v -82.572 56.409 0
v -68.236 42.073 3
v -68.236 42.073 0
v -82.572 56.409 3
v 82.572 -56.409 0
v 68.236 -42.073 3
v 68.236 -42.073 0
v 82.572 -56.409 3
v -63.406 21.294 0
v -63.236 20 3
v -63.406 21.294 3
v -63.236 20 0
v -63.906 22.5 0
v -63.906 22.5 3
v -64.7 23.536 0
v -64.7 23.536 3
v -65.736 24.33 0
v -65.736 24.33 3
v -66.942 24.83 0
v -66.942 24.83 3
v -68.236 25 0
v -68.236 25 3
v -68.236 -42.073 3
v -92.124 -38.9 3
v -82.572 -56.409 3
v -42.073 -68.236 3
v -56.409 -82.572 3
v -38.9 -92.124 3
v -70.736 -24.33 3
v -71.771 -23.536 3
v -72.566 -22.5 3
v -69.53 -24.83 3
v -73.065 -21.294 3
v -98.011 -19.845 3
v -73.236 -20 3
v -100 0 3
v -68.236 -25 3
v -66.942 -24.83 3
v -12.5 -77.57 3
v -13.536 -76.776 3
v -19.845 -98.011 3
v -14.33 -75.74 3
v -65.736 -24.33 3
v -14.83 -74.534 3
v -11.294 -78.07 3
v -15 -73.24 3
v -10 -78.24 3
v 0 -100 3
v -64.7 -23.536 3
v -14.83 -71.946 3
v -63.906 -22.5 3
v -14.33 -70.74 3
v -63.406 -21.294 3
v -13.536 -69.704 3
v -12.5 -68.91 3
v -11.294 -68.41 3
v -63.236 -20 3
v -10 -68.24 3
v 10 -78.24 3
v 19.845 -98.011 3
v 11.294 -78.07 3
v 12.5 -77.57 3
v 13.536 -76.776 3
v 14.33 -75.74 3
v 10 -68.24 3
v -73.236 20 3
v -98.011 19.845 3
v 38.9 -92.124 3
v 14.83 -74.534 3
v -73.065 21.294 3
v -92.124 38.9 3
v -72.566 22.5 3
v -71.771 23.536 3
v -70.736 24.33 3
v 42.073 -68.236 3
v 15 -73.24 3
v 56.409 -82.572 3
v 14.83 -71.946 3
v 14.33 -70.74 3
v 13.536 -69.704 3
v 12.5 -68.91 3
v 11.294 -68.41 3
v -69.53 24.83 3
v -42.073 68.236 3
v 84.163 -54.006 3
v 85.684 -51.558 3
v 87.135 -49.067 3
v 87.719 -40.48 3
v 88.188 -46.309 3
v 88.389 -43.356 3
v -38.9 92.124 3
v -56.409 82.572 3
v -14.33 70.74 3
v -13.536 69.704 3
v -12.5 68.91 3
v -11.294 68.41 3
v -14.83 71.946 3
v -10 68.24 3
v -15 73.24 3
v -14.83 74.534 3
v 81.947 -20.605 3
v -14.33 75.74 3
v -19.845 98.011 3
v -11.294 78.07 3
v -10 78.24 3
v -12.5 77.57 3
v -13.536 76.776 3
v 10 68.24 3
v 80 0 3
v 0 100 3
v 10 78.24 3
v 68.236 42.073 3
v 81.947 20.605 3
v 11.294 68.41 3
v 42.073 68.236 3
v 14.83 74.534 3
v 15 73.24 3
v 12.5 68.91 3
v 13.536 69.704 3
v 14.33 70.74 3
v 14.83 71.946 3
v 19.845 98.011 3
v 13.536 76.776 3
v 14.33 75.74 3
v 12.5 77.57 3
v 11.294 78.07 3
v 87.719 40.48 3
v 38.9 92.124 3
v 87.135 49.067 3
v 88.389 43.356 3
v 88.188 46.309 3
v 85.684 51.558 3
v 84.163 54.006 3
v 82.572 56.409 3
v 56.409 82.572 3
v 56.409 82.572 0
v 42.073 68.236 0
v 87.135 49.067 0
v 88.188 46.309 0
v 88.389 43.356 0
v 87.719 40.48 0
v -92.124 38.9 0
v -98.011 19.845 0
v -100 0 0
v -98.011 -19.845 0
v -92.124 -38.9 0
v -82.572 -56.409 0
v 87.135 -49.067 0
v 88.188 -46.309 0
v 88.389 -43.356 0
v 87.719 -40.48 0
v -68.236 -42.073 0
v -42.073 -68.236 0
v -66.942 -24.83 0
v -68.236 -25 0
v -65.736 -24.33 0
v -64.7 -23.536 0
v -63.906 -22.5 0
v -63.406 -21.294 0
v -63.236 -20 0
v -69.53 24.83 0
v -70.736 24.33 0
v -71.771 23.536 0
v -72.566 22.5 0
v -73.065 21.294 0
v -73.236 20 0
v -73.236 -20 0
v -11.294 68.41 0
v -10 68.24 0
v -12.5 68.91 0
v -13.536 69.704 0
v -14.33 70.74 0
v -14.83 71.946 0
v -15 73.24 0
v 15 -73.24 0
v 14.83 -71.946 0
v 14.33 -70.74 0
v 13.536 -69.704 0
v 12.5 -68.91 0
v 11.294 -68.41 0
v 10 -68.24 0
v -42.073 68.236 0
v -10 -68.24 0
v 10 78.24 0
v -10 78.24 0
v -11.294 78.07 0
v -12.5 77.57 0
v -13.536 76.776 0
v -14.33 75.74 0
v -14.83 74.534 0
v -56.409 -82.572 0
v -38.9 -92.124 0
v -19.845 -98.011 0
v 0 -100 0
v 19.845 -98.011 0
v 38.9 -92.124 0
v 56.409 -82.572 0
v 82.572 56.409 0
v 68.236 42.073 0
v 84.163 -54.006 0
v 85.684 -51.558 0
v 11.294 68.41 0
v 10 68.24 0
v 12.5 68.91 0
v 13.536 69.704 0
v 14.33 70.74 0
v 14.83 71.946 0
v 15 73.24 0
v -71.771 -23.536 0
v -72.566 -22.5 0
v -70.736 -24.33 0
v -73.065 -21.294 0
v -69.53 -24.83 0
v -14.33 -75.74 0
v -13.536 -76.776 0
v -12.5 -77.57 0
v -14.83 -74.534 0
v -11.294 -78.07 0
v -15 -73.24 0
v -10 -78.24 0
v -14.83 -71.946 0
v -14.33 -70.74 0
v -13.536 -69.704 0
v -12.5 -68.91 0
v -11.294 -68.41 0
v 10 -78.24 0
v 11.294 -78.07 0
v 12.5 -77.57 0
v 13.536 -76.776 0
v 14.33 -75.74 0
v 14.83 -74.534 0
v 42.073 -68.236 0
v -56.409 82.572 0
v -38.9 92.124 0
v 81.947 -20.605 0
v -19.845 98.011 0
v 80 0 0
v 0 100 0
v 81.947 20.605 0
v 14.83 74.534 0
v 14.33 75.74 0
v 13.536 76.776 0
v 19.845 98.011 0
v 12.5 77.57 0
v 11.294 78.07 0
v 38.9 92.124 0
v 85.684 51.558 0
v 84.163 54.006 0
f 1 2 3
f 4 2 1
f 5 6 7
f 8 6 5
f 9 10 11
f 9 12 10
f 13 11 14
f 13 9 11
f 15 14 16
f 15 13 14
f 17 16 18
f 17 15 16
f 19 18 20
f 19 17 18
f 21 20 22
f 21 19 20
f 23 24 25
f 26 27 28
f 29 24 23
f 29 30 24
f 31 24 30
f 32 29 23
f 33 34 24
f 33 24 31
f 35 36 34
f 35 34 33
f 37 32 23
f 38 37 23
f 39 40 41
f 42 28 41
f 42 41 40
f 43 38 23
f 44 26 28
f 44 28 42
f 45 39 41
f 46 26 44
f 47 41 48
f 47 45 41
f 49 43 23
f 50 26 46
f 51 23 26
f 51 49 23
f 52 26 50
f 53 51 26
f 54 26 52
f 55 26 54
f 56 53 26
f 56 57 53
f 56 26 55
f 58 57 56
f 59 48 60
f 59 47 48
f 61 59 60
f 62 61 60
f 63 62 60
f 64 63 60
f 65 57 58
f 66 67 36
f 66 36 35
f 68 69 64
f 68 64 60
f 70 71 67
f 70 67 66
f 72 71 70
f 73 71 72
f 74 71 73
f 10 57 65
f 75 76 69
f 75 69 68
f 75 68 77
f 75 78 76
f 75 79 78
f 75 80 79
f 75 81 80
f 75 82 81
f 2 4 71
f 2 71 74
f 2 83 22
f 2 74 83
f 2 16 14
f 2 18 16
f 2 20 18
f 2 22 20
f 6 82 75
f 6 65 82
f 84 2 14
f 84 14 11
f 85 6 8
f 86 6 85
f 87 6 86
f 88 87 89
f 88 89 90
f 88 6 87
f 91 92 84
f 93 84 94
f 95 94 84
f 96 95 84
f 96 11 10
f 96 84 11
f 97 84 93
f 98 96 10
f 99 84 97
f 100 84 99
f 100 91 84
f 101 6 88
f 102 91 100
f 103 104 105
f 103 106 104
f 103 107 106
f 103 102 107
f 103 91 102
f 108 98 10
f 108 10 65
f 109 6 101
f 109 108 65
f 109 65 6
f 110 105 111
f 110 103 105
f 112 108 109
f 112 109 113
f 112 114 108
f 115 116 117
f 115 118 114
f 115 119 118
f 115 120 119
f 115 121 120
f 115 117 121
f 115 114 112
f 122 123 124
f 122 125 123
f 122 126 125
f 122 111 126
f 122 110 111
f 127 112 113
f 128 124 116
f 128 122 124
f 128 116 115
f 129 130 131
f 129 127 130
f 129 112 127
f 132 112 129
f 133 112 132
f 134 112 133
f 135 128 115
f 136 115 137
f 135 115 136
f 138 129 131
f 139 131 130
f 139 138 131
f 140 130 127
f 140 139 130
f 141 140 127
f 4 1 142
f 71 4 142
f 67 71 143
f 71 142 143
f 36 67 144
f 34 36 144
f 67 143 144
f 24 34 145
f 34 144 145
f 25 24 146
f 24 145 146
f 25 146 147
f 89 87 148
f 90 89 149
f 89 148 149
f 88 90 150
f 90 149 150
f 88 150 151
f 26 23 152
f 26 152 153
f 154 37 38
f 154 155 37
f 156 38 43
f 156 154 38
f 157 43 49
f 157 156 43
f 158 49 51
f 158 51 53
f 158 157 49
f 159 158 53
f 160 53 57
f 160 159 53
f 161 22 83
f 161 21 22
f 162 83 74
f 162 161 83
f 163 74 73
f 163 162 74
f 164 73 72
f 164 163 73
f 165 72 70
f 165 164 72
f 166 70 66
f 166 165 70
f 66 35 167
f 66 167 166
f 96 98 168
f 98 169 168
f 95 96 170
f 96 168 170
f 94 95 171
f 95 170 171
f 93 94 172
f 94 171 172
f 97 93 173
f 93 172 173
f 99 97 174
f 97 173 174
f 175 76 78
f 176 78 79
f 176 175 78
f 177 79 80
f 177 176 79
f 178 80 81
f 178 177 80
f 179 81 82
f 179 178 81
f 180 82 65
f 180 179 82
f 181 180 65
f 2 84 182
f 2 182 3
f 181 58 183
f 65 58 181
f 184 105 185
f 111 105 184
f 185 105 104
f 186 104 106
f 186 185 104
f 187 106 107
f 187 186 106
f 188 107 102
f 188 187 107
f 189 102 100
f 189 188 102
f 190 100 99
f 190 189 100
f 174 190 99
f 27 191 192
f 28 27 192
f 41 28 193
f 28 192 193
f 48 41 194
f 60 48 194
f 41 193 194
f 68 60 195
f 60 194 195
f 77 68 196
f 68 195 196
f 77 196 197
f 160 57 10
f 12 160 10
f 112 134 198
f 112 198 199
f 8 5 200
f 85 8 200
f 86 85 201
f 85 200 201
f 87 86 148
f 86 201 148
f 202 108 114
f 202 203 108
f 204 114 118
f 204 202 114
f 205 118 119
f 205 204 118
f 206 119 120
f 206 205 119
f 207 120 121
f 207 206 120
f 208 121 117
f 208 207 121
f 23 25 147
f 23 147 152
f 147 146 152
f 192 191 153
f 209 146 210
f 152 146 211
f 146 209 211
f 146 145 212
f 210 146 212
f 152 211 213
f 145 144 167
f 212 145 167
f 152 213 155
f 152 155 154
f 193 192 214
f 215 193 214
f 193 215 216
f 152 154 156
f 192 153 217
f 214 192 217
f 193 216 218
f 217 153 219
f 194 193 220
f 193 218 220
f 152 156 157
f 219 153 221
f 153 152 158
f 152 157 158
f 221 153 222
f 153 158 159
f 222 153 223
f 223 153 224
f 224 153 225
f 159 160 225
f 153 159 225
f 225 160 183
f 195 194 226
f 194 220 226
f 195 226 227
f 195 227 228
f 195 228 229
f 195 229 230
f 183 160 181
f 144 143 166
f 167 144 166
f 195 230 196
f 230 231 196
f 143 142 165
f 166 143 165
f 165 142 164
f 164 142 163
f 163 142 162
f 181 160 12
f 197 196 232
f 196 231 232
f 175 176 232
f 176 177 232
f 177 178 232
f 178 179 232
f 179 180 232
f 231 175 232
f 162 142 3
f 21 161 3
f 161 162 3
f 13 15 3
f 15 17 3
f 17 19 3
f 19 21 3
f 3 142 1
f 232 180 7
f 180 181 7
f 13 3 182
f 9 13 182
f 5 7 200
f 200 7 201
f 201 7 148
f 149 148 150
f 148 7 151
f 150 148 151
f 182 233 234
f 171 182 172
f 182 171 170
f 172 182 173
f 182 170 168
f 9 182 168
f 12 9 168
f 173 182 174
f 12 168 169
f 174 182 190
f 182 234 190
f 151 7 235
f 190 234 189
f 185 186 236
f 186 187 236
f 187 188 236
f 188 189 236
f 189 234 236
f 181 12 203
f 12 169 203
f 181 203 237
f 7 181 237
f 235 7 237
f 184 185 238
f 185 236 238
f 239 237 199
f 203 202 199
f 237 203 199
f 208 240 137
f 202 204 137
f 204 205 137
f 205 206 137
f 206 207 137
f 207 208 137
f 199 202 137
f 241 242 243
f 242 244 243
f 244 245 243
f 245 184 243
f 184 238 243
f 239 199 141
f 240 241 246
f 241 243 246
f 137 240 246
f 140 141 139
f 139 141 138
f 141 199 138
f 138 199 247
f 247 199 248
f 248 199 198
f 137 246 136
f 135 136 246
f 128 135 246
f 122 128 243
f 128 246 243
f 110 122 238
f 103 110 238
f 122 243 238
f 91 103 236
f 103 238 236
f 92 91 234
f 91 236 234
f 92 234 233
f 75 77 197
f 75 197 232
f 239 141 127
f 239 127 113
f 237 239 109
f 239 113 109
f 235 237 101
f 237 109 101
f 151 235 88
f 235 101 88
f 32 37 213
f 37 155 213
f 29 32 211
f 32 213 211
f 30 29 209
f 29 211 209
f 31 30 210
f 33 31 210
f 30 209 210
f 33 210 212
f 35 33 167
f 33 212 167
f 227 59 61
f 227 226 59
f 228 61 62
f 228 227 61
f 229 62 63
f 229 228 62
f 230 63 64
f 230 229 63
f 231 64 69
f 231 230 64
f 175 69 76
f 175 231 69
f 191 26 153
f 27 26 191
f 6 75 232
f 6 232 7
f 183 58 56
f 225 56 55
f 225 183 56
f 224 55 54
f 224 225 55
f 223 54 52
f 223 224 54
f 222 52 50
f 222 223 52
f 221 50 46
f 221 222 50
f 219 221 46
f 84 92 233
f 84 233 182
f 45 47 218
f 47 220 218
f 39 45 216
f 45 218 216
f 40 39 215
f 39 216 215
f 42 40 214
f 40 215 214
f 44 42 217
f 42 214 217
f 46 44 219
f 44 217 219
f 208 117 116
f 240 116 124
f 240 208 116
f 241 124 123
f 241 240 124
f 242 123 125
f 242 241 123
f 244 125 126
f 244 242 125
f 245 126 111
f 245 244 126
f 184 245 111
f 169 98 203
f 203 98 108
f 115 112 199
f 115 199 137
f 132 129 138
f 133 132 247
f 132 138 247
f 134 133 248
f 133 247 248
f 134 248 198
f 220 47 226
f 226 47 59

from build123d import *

# Parameters (mm, degrees)
CROQUIS1_R              = 100
SALIENTE_EXTRUIR1_DEPTH = 3
CROQUIS3_R              = 110
CORTAR_EXTRUIR1_DEPTH   = 3
REDONDEO1_R             = 10
CORTAR_EXTRUIR2_DEPTH   = 142.453172607
CROQUIS6_W              = 10
CROQUIS6_H              = 50
CROQUIS6_W_2            = 30
CROQUIS6_H_2            = 10
CORTAR_EXTRUIR4_DEPTH   = 10
REDONDEO3_R             = 5


with BuildPart() as part:
    # Croquis1 → Saliente-Extruir1 (new body)
    with BuildSketch(Plane.XY):
        Circle(CROQUIS1_R)
    extrude(amount=SALIENTE_EXTRUIR1_DEPTH)

    # Croquis3 → Cortar-Extruir1 (cut)
    with BuildSketch(Plane.XY.offset(3)):
        with Locations((190, 0)):
            Circle(CROQUIS3_R)
    extrude(amount=-CORTAR_EXTRUIR1_DEPTH, mode=Mode.SUBTRACT)

    # Redondeo1
    redondeo1_edges = [part.edges().sort_by_distance(p)[0] for p in [
        (89.473684211, -44.659375654, 1.5),
        (89.473684211, 44.659375654, 1.5),
    ]]
    fillet(redondeo1_edges, radius=REDONDEO1_R)

    # Croquis4 → Cortar-Extruir2 (cut, through all)
    with BuildSketch(Plane.XY.offset(3)):
        Polygon((-57.629202667, -83.792153571), (-83.792153571, -57.629202667), (-68.235804385, -42.072853481), (-42.072853481, -68.235804385), align=None)
        Polygon((-57.629202667, 83.792153571), (-42.072853481, 68.235804385), (-68.235804385, 42.072853481), (-83.792153571, 57.629202667), align=None)
        Polygon((83.792153571, 57.629202667), (68.235804385, 42.072853481), (42.072853481, 68.235804385), (57.629202667, 83.792153571), align=None)
        Polygon((57.629202667, -83.792153571), (42.072853481, -68.235804385), (68.235804385, -42.072853481), (83.792153571, -57.629202667), align=None)
    extrude(amount=-CORTAR_EXTRUIR2_DEPTH, mode=Mode.SUBTRACT)

    # Croquis6 → Cortar-Extruir4 (cut)
    with BuildSketch(Plane.XY.offset(3)):
        with Locations((-68.235804385, 0)):
            Rectangle(CROQUIS6_W, CROQUIS6_H)
        with Locations((0, 73.24)):
            Rectangle(CROQUIS6_W_2, CROQUIS6_H_2)
        with Locations((0, -73.24)):
            Rectangle(CROQUIS6_W_2, CROQUIS6_H_2)
    extrude(amount=-CORTAR_EXTRUIR4_DEPTH, mode=Mode.SUBTRACT)

    # Redondeo3
    redondeo3_edges = [part.edges().sort_by_distance(p)[0] for p in [
        (15, -78.24, 1.5),
        (-15, -78.24, 1.5),
        (15, -68.24, 1.5),
        (-15, -68.24, 1.5),
        (-73.235804385, -25, 1.5),
        (-63.235804385, -25, 1.5),
        (-73.235804385, 25, 1.5),
        (-63.235804385, 25, 1.5),
        (-15, 68.24, 1.5),
        (15, 68.24, 1.5),
        (-15, 78.24, 1.5),
        (15, 78.24, 1.5),
    ]]
    fillet(redondeo3_edges, radius=REDONDEO3_R - 0.0001)  # a hair under: the kernel refuses the full size


solid = part.part
